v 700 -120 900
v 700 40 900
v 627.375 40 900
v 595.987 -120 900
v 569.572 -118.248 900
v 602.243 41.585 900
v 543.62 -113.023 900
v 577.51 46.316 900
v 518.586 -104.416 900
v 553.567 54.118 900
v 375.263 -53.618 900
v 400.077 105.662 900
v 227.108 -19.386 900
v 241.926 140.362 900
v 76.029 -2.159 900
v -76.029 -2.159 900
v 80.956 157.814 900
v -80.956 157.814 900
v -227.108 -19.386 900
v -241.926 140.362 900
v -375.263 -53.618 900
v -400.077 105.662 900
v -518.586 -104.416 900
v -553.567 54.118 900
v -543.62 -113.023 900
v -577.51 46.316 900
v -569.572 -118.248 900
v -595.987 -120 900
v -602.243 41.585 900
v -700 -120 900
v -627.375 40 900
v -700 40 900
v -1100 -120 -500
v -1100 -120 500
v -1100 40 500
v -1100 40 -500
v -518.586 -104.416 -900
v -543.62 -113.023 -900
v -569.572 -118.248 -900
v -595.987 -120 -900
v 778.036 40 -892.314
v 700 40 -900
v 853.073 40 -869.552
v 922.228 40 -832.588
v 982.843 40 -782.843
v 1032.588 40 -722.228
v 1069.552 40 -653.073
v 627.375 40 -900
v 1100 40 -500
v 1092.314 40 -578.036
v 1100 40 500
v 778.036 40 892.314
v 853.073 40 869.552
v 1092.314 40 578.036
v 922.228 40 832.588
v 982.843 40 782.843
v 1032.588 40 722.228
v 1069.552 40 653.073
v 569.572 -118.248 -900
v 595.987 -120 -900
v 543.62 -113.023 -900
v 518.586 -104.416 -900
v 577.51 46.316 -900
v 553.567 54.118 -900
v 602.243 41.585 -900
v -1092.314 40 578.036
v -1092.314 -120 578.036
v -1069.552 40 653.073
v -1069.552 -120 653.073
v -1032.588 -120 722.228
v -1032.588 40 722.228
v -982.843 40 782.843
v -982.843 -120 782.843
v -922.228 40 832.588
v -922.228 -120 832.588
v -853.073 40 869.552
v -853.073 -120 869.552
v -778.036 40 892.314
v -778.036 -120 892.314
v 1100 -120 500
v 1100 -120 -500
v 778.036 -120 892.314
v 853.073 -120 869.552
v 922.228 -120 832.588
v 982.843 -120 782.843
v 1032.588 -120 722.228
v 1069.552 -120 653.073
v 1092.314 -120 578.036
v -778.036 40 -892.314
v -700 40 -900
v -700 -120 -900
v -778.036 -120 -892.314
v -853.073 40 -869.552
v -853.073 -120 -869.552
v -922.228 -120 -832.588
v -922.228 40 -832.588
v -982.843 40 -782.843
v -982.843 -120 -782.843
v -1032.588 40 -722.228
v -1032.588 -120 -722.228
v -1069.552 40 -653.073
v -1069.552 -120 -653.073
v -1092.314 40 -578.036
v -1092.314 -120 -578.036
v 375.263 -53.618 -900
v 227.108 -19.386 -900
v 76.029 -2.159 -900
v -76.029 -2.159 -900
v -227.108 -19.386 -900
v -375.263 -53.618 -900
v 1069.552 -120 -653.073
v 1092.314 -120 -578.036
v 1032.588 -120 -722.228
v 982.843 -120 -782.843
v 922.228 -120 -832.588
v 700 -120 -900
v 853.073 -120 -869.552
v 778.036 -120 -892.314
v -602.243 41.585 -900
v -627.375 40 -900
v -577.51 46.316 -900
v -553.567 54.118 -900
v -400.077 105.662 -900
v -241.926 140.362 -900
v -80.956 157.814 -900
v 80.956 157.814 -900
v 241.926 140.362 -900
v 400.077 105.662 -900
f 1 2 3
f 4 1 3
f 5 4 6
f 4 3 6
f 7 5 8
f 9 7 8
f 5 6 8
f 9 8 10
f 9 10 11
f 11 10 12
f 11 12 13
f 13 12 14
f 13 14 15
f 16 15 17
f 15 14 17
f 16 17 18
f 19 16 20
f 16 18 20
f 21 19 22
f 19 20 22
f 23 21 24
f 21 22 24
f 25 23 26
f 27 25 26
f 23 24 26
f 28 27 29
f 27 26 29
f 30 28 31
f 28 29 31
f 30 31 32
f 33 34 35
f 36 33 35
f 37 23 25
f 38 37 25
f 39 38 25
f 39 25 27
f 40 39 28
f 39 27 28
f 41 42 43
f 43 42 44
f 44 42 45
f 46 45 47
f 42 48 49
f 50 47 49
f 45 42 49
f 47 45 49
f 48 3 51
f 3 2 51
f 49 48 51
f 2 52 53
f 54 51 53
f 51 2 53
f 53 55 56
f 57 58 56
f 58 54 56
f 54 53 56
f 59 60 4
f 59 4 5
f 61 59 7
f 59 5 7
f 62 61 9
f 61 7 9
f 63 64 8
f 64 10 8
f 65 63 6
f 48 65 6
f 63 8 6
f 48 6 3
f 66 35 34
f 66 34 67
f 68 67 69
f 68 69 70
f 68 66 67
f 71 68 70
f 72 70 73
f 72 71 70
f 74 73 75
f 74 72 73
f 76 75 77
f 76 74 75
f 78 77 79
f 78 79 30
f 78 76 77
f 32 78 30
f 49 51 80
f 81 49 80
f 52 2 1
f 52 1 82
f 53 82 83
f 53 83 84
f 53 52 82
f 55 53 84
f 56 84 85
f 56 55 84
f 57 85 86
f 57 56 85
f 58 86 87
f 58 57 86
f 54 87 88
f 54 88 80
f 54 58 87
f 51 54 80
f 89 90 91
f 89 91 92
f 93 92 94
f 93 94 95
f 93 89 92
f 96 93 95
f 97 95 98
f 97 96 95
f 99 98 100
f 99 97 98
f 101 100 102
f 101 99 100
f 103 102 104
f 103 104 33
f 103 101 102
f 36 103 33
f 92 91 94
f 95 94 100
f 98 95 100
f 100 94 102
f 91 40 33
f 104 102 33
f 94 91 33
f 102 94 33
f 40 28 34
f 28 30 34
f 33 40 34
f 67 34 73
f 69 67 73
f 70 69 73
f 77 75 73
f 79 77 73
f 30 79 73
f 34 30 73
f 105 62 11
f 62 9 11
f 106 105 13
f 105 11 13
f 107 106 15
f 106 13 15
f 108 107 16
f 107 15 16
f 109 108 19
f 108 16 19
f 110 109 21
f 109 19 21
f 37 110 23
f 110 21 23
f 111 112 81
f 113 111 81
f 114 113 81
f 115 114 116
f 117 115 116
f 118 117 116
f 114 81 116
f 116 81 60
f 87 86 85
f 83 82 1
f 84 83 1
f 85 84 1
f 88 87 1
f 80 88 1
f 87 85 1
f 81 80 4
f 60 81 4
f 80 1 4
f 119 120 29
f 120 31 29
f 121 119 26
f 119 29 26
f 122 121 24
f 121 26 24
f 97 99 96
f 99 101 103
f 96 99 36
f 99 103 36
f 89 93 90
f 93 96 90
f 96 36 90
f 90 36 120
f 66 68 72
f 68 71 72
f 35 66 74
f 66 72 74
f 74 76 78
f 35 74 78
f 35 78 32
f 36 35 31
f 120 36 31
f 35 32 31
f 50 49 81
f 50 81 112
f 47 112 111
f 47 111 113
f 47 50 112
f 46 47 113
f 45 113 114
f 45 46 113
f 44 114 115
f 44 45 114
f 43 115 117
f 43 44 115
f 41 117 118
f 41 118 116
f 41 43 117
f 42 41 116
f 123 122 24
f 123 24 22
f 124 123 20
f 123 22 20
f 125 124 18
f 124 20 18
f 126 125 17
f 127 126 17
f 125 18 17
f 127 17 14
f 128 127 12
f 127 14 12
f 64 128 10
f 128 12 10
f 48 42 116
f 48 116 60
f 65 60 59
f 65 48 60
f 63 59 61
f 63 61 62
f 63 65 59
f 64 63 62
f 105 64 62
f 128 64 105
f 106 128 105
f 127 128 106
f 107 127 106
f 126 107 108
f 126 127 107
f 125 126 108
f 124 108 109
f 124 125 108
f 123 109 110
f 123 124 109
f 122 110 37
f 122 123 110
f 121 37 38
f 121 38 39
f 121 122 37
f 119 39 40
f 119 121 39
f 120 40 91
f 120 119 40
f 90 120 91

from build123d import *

# Parameters (mm, degrees)
EXTRUDE_1_DEPTH     = 900
SKETCH_3_OUTSIDE_W  = 2773.258
SKETCH_3_OUTSIDE_H  = 2373.258
CUT_EXTRUDE_3_DEPTH = 1431.244734302


with BuildPart() as part:
    # Эскиз1 → Бобышка-Вытянуть1 (new, symmetric)
    with BuildSketch(Plane.XY):
        with BuildLine():
            Line((-1100, -120), (-1100, 40))
            Line((-1100, 40), (-627.375485654, 40))
            ThreePointArc((-627.375485654, 40), (-589.802028189, 43.561115626), (-553.566604989, 54.117647059))
            ThreePointArc((-553.566604989, 54.117647059), (0, 160), (553.566604989, 54.117647059))
            ThreePointArc((553.566604989, 54.117647059), (589.802028189, 43.561115626), (627.375485654, 40))
            Line((627.375485654, 40), (1100, 40))
            Line((1100, 40), (1100, -120))
            Line((1100, -120), (595.98657703, -120))
            ThreePointArc((595.98657703, -120), (556.509475332, -116.065189265), (518.58572287, -104.415584416))
            ThreePointArc((518.58572287, -104.415584416), (0, 0), (-518.58572287, -104.415584416))
            ThreePointArc((-518.58572287, -104.415584416), (-556.509475332, -116.065189265), (-595.98657703, -120))
            Line((-595.98657703, -120), (-1100, -120))
        make_face()
    extrude(amount=EXTRUDE_1_DEPTH, both=True)

    # Эскиз3 outside → Вырез-Вытянуть3 (cut, through all)
    with BuildSketch(Plane(origin=(0, 40, 0), x_dir=(1, 0, 0), z_dir=(0, 1, 0))):
        Rectangle(SKETCH_3_OUTSIDE_W, SKETCH_3_OUTSIDE_H)
        with BuildLine():
            Line((700, 900), (-700, 900))
            ThreePointArc((-700, 900), (-982.842712475, 782.842712475), (-1100, 500))
            Line((-1100, 500), (-1100, -500))
            ThreePointArc((-1100, -500), (-982.842712475, -782.842712475), (-700, -900))
            Line((-700, -900), (700, -900))
            ThreePointArc((700, -900), (982.842712475, -782.842712475), (1100, -500))
            Line((1100, -500), (1100, 500))
            ThreePointArc((1100, 500), (982.842712475, 782.842712475), (700, 900))
        make_face(mode=Mode.SUBTRACT)
    extrude(amount=-CUT_EXTRUDE_3_DEPTH, mode=Mode.SUBTRACT)


solid = part.part
